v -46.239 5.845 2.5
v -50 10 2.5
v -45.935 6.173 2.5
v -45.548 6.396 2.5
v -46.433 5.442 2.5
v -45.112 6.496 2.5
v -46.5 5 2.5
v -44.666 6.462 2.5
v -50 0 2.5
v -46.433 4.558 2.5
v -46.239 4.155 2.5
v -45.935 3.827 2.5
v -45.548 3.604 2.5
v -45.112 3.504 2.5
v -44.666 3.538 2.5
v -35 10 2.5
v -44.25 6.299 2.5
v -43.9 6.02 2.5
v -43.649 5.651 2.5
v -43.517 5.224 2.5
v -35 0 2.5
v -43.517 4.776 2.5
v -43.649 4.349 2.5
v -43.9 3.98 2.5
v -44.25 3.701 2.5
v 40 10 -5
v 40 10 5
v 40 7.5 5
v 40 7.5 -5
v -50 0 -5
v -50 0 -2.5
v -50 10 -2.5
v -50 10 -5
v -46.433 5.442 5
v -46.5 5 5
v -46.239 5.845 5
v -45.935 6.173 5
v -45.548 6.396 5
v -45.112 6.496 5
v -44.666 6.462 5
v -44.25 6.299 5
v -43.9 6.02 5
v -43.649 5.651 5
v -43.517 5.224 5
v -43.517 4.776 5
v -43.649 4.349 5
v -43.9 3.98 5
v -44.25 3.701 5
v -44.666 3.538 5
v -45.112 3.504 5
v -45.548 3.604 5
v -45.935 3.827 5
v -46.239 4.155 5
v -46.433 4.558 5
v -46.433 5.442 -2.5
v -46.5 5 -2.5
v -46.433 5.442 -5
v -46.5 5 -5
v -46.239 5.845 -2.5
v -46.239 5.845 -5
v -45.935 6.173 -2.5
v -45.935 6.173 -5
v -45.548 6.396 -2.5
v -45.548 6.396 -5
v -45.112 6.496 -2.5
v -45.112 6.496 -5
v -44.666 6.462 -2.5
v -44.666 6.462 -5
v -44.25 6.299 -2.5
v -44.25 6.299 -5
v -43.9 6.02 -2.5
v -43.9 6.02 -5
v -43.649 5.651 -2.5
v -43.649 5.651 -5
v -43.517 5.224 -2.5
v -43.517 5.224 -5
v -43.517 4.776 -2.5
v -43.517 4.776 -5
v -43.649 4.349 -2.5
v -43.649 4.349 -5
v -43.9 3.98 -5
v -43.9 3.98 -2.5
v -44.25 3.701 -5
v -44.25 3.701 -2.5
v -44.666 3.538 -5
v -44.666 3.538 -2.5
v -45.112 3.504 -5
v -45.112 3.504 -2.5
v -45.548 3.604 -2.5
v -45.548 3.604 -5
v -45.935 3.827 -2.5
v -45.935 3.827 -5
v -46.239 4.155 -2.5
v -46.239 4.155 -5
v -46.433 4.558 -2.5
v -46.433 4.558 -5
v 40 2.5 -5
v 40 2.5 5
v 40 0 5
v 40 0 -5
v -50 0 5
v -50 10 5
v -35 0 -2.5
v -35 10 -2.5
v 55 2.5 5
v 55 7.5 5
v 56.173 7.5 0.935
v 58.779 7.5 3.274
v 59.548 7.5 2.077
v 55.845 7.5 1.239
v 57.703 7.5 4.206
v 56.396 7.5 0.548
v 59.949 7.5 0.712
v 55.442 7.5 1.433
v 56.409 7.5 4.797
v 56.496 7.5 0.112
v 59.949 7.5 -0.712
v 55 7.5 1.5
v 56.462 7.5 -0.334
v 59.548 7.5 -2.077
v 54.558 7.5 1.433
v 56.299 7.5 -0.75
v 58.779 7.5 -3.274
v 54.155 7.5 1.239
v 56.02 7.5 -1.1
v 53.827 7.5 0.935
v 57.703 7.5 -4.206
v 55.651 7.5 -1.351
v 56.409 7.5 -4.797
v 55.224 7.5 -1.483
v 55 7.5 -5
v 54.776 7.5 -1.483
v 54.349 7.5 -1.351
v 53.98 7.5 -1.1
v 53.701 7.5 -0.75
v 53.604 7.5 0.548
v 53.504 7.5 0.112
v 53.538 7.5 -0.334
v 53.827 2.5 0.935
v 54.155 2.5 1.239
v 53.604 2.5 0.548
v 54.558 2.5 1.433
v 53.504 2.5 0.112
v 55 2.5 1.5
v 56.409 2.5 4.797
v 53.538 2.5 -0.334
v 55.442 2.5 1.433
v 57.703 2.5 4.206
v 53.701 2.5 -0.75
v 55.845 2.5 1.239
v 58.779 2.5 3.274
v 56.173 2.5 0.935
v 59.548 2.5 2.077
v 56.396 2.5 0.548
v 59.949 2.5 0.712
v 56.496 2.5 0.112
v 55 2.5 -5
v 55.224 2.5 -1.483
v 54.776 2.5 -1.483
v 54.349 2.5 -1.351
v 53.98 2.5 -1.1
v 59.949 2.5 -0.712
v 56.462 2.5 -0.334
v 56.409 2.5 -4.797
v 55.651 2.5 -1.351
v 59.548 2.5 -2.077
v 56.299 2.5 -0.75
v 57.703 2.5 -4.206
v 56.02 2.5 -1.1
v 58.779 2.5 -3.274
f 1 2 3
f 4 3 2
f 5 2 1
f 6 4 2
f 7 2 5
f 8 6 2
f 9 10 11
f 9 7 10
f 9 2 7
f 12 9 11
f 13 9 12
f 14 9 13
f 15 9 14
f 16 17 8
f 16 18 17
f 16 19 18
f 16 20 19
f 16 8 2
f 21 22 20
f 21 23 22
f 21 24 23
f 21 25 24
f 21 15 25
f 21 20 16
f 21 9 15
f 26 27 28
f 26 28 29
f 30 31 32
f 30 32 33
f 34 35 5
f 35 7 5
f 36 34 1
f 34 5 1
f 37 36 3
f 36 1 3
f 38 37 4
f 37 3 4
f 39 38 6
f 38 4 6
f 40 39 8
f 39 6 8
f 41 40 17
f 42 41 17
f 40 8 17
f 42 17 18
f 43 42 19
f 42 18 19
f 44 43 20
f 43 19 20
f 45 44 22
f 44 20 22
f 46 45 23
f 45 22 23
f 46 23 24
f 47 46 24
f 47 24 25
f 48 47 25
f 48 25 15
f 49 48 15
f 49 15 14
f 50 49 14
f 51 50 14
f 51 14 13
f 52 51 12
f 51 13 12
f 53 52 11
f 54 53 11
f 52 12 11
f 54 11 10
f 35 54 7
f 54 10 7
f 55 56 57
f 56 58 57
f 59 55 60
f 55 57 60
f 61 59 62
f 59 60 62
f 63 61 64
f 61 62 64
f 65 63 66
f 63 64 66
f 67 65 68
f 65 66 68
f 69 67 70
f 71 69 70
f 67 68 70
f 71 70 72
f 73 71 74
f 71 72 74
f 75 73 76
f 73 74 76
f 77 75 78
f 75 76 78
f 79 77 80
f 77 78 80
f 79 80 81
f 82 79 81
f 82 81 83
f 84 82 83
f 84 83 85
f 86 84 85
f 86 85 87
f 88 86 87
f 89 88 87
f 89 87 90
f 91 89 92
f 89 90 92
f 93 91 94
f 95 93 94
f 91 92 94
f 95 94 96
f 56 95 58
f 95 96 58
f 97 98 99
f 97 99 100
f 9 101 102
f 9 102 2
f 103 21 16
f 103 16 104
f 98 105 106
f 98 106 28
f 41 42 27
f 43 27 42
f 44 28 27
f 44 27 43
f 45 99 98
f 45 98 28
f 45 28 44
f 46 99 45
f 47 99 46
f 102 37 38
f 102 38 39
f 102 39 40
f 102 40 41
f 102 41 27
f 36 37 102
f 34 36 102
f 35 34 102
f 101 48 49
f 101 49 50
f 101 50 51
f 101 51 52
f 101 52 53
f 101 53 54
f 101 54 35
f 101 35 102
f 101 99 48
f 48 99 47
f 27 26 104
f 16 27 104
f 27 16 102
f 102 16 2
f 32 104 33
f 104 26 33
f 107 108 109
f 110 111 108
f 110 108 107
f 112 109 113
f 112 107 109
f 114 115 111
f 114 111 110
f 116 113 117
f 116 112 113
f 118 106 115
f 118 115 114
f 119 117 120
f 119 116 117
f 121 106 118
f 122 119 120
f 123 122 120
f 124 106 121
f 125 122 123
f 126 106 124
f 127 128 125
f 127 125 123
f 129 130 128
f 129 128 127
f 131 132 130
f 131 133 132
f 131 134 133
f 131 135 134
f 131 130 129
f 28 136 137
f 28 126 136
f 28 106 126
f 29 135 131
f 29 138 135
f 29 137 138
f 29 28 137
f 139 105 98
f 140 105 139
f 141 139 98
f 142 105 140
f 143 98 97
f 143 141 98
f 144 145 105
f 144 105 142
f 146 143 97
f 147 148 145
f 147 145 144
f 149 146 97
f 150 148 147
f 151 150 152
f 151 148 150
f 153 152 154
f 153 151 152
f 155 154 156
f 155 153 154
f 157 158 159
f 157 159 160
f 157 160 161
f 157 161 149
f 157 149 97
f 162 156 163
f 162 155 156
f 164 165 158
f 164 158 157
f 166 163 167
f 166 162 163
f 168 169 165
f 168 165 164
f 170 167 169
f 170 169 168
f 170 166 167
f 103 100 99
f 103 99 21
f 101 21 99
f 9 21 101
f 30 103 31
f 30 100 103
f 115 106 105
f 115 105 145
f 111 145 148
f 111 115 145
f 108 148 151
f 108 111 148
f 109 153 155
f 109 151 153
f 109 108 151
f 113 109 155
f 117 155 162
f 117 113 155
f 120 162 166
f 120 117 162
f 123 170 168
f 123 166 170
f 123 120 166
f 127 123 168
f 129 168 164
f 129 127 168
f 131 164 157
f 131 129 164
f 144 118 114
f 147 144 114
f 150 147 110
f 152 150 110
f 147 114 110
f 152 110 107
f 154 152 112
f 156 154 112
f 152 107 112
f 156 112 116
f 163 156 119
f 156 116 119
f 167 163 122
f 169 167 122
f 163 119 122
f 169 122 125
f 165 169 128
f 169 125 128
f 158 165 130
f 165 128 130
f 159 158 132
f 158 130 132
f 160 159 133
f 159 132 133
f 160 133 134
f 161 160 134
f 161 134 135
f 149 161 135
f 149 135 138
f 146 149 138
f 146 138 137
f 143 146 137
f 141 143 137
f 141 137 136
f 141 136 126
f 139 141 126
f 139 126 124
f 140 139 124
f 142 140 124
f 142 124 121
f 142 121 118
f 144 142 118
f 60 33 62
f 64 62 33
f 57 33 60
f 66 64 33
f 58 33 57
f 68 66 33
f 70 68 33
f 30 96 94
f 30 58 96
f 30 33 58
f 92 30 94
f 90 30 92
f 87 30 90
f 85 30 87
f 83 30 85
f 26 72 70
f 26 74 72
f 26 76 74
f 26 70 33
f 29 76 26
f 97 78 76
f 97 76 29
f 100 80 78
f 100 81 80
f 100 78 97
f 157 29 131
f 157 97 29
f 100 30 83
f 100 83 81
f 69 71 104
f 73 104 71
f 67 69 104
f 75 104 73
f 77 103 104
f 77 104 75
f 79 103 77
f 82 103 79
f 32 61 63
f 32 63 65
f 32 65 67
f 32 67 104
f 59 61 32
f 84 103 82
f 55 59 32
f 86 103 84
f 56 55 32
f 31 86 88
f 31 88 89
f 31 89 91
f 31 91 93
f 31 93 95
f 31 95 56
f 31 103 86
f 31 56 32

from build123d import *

# Parameters (mm, degrees)
SALIENTE_EXTRUIR1_DEPTH = 10
CROQUIS2_W              = 10
CROQUIS2_H              = 5
SALIENTE_EXTRUIR2_DEPTH = 10
CROQUIS4_R              = 1.5
CORTAR_EXTRUIR1_DEPTH   = 10
CROQUIS5_R              = 1.5
CORTAR_EXTRUIR2_DEPTH   = 9.5
SKETCH1_W               = 10
SKETCH1_H               = 2.5
CUT_EXTRUDE1_DEPTH      = 10


with BuildPart() as part:
    # Croquis1 → Saliente-Extruir1 (new body)
    with BuildSketch(Plane(origin=(0, 0, 0), x_dir=(1, 0, 0), z_dir=(0, 1, 0))):
        Polygon((-50, 2.5), (-50, 5), (50, 5), (50, -5), (-50, -5), (-50, -2.5), (-35, -2.5), (-35, 2.5), align=None)
    extrude(amount=SALIENTE_EXTRUIR1_DEPTH)

    # Croquis2 → Saliente-Extruir2 (add)
    with BuildSketch(Plane(origin=(50, 0, 0), x_dir=(0, 0, -1), z_dir=(1, 0, 0))):
        with Locations((0, 5)):
            Rectangle(CROQUIS2_W, CROQUIS2_H)
    extrude(amount=SALIENTE_EXTRUIR2_DEPTH)

    # Croquis4 → Cortar-Extruir1 (cut)
    with BuildSketch(Plane(origin=(0, 7.5, 0), x_dir=(1, 0, 0), z_dir=(0, 1, 0))):
        with Locations(Location((55, 0, 0), (0, 0, 270))):
            Circle(CROQUIS4_R)
        with BuildLine():
            Line((55, 5), (55, 11.029230351))
            Line((55, 11.029230351), (66.142651686, 11.029230351))
            Line((66.142651686, 11.029230351), (66.142651686, -12.901676623))
            Line((66.142651686, -12.901676623), (58.757445268, -12.901676623))
            Line((58.757445268, -12.901676623), (55, -5))
            ThreePointArc((55, -5), (60, 0), (55, 5))
        make_face()
    extrude(amount=-CORTAR_EXTRUIR1_DEPTH, mode=Mode.SUBTRACT)

    # Croquis5 → Cortar-Extruir2 (cut, symmetric)
    with BuildSketch(Plane(origin=(0, 0, 2.5), x_dir=(-1, 0, 0), z_dir=(0, 0, -1))):
        with Locations((45, 5)):
            Circle(CROQUIS5_R)
    extrude(amount=CORTAR_EXTRUIR2_DEPTH, both=True, mode=Mode.SUBTRACT)

    # Sketch1 → Cut-Extrude1 (cut)
    with BuildSketch(Plane(origin=(50, 0, 0), x_dir=(0, 0, -1), z_dir=(1, 0, 0))):
        with Locations((0, 8.75)):
            Rectangle(SKETCH1_W, SKETCH1_H)
        with Locations((0, 1.25)):
            Rectangle(SKETCH1_W, SKETCH1_H)
    extrude(amount=-CUT_EXTRUDE1_DEPTH, mode=Mode.SUBTRACT)


solid = part.part
